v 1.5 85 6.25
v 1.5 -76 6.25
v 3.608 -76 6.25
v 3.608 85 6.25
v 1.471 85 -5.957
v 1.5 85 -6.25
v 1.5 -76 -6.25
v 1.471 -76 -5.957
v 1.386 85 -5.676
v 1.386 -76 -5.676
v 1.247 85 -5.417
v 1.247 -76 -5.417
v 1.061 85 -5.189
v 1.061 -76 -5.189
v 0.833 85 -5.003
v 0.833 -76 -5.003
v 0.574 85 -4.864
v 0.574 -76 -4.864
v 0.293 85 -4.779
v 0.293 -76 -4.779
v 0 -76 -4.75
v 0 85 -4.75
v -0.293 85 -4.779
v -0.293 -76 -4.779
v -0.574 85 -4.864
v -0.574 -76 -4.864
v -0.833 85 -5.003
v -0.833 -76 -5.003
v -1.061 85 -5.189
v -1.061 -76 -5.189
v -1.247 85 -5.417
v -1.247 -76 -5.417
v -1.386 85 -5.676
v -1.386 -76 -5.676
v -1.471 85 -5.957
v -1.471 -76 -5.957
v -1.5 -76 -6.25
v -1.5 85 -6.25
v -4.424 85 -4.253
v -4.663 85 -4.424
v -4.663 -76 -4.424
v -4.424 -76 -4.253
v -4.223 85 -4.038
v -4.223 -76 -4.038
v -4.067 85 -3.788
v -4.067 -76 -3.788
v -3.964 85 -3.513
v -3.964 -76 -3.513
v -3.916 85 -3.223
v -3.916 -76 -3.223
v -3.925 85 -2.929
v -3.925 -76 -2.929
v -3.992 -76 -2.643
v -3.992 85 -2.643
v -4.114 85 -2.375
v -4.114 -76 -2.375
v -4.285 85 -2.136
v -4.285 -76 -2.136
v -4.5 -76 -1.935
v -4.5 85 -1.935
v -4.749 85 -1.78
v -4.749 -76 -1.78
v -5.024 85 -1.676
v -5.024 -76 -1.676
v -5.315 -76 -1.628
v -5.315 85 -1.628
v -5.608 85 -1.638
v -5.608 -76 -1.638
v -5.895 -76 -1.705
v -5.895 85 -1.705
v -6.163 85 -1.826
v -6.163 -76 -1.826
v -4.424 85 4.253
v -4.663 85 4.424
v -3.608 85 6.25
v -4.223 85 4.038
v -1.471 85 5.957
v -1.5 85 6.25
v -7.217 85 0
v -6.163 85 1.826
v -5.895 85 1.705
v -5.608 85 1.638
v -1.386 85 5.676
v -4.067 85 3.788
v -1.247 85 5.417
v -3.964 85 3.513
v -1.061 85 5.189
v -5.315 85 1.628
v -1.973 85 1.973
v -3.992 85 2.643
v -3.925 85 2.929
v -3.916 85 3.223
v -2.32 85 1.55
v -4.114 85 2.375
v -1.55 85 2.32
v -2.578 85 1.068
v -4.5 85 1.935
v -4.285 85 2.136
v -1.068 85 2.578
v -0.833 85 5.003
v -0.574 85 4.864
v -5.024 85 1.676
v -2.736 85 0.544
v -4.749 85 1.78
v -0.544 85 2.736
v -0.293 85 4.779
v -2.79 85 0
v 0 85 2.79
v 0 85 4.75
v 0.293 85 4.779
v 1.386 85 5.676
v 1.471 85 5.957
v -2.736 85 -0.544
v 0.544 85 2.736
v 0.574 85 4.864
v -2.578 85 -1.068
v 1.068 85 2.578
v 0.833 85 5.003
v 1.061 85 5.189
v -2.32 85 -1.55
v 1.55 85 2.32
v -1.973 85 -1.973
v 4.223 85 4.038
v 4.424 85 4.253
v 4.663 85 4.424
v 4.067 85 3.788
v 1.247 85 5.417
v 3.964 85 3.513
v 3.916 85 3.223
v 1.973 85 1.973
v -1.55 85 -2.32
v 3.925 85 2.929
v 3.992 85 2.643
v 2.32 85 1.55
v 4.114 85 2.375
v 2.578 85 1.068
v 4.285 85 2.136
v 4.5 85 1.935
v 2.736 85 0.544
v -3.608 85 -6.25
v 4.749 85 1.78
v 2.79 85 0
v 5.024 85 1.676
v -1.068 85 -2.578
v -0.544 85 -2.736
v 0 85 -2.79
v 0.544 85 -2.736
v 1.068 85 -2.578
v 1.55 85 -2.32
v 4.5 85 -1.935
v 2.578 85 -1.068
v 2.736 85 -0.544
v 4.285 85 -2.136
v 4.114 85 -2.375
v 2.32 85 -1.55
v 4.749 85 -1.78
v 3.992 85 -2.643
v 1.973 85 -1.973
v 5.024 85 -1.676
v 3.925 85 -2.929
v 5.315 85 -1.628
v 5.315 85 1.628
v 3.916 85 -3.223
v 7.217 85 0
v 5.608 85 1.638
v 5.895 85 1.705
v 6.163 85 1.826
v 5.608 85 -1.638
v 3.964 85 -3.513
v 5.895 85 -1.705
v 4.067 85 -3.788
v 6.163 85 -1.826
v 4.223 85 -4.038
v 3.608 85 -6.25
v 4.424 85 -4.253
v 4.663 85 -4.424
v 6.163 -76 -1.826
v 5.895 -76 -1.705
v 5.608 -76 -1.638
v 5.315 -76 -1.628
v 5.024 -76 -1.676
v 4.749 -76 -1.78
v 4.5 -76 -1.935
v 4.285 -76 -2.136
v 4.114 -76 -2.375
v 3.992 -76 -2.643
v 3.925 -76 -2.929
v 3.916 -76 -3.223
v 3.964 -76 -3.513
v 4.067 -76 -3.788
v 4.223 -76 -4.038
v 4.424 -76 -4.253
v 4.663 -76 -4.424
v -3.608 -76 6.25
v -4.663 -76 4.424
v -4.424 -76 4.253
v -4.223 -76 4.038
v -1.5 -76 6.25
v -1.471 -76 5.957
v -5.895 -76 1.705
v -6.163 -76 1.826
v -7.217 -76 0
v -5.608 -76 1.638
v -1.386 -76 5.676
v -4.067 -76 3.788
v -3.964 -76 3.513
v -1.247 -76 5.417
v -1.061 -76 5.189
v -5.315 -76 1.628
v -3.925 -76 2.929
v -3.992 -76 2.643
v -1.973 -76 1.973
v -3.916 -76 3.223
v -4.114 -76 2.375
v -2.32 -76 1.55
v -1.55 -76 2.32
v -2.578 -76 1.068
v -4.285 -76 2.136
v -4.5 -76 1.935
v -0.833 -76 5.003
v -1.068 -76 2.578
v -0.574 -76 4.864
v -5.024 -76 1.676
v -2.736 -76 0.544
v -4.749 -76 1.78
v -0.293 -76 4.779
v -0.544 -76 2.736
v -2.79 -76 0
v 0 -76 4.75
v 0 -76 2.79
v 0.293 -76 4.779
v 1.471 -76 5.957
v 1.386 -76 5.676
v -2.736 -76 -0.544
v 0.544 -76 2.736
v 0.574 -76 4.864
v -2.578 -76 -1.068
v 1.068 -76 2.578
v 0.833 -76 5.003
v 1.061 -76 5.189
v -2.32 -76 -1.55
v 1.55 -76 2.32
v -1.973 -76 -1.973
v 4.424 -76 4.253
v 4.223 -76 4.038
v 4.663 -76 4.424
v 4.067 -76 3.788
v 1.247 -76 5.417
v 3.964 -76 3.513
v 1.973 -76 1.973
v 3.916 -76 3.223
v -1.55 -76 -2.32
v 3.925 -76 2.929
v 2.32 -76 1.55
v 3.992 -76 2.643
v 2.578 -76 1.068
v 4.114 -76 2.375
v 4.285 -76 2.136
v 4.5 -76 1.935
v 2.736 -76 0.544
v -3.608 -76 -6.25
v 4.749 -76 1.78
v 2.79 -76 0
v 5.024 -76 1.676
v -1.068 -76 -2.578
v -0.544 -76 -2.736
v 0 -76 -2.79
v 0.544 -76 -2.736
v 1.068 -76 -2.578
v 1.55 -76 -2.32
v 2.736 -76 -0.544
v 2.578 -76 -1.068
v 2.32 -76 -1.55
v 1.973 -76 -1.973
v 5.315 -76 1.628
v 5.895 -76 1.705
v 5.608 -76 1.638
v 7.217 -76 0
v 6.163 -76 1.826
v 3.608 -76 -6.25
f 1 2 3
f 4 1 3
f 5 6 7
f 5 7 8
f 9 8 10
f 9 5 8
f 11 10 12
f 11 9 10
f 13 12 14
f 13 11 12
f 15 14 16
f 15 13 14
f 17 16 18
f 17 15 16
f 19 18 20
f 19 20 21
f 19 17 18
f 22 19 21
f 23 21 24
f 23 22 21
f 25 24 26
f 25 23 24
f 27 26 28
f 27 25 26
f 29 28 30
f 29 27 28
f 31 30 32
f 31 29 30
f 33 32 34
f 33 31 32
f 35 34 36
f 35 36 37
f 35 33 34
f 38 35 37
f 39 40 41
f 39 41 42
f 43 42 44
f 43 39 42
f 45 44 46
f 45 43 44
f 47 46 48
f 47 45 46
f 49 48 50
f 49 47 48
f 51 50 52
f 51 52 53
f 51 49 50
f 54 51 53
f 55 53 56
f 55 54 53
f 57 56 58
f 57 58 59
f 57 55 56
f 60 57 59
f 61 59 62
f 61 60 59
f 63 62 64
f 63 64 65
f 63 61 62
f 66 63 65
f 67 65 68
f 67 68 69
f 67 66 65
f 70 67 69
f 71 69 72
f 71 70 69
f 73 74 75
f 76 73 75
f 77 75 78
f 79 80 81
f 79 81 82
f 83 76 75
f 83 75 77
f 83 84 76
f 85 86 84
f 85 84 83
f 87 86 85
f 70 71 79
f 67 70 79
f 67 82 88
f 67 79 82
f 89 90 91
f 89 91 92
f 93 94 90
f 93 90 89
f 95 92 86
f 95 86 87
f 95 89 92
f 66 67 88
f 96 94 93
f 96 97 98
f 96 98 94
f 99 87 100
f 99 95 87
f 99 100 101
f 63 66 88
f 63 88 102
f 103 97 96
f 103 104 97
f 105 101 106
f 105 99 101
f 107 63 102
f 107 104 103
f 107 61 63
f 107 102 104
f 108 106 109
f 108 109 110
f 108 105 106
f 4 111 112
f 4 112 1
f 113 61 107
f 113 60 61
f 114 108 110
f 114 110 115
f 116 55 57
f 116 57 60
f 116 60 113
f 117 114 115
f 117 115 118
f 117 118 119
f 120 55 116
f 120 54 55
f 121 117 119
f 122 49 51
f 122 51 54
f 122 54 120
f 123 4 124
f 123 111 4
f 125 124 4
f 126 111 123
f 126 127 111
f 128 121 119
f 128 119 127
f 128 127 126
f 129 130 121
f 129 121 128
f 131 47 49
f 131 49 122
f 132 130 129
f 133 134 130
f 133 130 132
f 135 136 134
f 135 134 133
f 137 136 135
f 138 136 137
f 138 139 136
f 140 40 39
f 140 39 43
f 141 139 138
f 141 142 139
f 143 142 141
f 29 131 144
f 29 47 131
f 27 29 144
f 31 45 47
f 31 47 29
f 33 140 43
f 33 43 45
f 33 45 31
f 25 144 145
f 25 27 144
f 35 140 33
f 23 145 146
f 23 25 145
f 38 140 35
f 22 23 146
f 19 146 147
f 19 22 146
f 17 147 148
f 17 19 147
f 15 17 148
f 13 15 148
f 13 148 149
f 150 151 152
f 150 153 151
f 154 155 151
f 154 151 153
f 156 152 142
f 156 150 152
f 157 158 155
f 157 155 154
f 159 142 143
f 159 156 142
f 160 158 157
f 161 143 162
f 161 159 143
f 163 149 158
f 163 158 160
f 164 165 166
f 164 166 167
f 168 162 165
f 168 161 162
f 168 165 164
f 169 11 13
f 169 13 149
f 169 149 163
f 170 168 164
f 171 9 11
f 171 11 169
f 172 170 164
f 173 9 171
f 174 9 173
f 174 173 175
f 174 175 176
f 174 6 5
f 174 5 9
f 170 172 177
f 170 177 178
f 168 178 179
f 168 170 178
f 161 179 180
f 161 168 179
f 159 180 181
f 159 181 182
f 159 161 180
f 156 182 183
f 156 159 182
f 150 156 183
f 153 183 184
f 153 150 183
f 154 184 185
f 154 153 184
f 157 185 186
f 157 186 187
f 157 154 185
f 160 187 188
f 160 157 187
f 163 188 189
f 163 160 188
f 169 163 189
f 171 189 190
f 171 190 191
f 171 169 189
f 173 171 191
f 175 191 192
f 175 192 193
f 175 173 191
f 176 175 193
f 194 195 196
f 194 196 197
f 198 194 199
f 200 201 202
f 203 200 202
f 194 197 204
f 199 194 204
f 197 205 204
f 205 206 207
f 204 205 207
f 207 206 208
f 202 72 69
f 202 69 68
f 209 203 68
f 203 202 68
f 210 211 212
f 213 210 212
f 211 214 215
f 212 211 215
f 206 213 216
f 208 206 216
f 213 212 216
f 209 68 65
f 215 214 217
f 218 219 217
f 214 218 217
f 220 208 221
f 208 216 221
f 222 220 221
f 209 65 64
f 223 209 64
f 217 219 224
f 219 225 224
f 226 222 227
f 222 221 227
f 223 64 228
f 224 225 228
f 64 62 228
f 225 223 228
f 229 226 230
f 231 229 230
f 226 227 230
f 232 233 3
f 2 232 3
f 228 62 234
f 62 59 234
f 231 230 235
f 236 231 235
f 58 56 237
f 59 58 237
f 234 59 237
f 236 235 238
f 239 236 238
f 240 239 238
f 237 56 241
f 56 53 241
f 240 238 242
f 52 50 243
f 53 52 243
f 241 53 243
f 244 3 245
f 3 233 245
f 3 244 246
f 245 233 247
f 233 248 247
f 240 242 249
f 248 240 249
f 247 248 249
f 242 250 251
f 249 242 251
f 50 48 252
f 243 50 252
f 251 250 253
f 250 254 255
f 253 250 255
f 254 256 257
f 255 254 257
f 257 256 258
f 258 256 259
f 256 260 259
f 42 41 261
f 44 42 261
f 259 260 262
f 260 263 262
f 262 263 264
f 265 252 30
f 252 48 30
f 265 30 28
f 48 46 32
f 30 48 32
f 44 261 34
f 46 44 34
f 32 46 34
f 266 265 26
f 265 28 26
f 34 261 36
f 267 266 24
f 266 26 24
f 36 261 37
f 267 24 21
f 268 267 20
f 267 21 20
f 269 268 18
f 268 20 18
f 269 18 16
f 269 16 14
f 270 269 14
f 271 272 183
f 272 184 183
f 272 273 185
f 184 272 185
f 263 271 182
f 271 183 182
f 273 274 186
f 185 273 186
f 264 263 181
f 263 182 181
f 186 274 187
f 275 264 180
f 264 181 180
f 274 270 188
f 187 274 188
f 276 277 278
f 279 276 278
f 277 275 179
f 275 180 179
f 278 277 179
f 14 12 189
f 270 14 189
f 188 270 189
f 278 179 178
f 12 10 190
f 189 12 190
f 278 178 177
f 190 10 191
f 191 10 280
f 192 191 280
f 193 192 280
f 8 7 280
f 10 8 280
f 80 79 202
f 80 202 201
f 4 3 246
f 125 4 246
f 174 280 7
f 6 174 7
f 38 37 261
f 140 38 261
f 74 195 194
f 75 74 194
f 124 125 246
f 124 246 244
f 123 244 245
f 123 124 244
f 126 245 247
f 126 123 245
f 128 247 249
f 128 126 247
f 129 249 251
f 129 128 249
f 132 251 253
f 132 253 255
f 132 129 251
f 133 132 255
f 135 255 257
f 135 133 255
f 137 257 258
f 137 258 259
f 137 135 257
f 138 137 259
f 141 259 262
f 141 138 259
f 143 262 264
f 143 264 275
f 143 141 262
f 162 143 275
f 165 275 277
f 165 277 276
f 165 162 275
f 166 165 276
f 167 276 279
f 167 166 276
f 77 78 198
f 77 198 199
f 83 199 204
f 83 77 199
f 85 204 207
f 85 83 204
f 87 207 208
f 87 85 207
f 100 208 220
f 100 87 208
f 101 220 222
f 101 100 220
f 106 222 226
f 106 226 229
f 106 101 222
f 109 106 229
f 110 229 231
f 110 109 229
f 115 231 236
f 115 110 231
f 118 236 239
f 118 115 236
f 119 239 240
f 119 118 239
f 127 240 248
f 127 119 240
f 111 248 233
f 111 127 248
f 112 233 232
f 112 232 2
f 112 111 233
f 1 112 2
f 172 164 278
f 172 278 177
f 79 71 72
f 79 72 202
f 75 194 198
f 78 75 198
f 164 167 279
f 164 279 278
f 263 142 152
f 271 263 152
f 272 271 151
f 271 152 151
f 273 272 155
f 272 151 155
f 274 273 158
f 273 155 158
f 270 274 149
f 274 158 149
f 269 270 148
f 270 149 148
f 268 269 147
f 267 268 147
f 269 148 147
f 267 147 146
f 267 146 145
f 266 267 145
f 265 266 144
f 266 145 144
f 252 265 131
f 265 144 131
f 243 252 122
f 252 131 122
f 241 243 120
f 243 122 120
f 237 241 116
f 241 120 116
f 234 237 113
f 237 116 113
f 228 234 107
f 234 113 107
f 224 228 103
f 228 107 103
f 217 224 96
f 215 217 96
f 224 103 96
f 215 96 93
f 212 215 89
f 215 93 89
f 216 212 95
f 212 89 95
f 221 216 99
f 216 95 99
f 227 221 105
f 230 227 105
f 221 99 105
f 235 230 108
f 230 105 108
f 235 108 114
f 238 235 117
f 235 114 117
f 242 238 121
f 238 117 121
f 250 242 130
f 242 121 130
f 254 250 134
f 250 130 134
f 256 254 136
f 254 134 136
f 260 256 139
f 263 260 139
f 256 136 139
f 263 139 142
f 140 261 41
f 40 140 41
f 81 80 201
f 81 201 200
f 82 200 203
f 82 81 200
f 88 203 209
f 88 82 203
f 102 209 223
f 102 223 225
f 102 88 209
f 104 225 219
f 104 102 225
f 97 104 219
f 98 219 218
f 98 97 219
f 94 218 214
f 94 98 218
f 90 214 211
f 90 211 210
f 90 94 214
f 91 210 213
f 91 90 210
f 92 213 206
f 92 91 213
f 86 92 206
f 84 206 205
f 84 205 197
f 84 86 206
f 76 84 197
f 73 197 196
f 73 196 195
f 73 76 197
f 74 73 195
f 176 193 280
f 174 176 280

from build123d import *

# Parameters (mm, degrees)
ESBO_O1_R                = 2.79
RESSALTO_EXTRUS_O1_DEPTH = 161


with BuildPart() as part:
    # Esboço1 → Ressalto-extrusão1 (new body)
    with BuildSketch(Plane(origin=(0, 85, 0), x_dir=(1, 0, 0), z_dir=(0, 1, 0))):
        with BuildLine():
            Line((6.162658774, -1.825961894), (7.216878365, 0))
            Line((7.216878365, 0), (6.162658774, 1.825961894))
            ThreePointArc((6.162658774, 1.825961894), (4.113620668, 2.375), (4.662658774, 4.424038106))
            Line((4.662658774, 4.424038106), (3.608439182, 6.25))
            Line((3.608439182, 6.25), (1.5, 6.25))
            ThreePointArc((1.5, 6.25), (0, 4.75), (-1.5, 6.25))
            Line((-1.5, 6.25), (-3.608439182, 6.25))
            Line((-3.608439182, 6.25), (-4.662658774, 4.424038106))
            ThreePointArc((-4.662658774, 4.424038106), (-4.113620668, 2.375), (-6.162658774, 1.825961894))
            Line((-6.162658774, 1.825961894), (-7.216878365, 0))
            Line((-7.216878365, 0), (-6.162658774, -1.825961894))
            ThreePointArc((-6.162658774, -1.825961894), (-4.113620668, -2.375), (-4.662658774, -4.424038106))
            Line((-4.662658774, -4.424038106), (-3.608439182, -6.25))
            Line((-3.608439182, -6.25), (-1.5, -6.25))
            ThreePointArc((-1.5, -6.25), (0, -4.75), (1.5, -6.25))
            Line((1.5, -6.25), (3.608439182, -6.25))
            Line((3.608439182, -6.25), (4.662658774, -4.424038106))
            ThreePointArc((4.662658774, -4.424038106), (4.113620668, -2.375), (6.162658774, -1.825961894))
        make_face()
        Circle(ESBO_O1_R, mode=Mode.SUBTRACT)
    extrude(amount=-RESSALTO_EXTRUS_O1_DEPTH)


solid = part.part
